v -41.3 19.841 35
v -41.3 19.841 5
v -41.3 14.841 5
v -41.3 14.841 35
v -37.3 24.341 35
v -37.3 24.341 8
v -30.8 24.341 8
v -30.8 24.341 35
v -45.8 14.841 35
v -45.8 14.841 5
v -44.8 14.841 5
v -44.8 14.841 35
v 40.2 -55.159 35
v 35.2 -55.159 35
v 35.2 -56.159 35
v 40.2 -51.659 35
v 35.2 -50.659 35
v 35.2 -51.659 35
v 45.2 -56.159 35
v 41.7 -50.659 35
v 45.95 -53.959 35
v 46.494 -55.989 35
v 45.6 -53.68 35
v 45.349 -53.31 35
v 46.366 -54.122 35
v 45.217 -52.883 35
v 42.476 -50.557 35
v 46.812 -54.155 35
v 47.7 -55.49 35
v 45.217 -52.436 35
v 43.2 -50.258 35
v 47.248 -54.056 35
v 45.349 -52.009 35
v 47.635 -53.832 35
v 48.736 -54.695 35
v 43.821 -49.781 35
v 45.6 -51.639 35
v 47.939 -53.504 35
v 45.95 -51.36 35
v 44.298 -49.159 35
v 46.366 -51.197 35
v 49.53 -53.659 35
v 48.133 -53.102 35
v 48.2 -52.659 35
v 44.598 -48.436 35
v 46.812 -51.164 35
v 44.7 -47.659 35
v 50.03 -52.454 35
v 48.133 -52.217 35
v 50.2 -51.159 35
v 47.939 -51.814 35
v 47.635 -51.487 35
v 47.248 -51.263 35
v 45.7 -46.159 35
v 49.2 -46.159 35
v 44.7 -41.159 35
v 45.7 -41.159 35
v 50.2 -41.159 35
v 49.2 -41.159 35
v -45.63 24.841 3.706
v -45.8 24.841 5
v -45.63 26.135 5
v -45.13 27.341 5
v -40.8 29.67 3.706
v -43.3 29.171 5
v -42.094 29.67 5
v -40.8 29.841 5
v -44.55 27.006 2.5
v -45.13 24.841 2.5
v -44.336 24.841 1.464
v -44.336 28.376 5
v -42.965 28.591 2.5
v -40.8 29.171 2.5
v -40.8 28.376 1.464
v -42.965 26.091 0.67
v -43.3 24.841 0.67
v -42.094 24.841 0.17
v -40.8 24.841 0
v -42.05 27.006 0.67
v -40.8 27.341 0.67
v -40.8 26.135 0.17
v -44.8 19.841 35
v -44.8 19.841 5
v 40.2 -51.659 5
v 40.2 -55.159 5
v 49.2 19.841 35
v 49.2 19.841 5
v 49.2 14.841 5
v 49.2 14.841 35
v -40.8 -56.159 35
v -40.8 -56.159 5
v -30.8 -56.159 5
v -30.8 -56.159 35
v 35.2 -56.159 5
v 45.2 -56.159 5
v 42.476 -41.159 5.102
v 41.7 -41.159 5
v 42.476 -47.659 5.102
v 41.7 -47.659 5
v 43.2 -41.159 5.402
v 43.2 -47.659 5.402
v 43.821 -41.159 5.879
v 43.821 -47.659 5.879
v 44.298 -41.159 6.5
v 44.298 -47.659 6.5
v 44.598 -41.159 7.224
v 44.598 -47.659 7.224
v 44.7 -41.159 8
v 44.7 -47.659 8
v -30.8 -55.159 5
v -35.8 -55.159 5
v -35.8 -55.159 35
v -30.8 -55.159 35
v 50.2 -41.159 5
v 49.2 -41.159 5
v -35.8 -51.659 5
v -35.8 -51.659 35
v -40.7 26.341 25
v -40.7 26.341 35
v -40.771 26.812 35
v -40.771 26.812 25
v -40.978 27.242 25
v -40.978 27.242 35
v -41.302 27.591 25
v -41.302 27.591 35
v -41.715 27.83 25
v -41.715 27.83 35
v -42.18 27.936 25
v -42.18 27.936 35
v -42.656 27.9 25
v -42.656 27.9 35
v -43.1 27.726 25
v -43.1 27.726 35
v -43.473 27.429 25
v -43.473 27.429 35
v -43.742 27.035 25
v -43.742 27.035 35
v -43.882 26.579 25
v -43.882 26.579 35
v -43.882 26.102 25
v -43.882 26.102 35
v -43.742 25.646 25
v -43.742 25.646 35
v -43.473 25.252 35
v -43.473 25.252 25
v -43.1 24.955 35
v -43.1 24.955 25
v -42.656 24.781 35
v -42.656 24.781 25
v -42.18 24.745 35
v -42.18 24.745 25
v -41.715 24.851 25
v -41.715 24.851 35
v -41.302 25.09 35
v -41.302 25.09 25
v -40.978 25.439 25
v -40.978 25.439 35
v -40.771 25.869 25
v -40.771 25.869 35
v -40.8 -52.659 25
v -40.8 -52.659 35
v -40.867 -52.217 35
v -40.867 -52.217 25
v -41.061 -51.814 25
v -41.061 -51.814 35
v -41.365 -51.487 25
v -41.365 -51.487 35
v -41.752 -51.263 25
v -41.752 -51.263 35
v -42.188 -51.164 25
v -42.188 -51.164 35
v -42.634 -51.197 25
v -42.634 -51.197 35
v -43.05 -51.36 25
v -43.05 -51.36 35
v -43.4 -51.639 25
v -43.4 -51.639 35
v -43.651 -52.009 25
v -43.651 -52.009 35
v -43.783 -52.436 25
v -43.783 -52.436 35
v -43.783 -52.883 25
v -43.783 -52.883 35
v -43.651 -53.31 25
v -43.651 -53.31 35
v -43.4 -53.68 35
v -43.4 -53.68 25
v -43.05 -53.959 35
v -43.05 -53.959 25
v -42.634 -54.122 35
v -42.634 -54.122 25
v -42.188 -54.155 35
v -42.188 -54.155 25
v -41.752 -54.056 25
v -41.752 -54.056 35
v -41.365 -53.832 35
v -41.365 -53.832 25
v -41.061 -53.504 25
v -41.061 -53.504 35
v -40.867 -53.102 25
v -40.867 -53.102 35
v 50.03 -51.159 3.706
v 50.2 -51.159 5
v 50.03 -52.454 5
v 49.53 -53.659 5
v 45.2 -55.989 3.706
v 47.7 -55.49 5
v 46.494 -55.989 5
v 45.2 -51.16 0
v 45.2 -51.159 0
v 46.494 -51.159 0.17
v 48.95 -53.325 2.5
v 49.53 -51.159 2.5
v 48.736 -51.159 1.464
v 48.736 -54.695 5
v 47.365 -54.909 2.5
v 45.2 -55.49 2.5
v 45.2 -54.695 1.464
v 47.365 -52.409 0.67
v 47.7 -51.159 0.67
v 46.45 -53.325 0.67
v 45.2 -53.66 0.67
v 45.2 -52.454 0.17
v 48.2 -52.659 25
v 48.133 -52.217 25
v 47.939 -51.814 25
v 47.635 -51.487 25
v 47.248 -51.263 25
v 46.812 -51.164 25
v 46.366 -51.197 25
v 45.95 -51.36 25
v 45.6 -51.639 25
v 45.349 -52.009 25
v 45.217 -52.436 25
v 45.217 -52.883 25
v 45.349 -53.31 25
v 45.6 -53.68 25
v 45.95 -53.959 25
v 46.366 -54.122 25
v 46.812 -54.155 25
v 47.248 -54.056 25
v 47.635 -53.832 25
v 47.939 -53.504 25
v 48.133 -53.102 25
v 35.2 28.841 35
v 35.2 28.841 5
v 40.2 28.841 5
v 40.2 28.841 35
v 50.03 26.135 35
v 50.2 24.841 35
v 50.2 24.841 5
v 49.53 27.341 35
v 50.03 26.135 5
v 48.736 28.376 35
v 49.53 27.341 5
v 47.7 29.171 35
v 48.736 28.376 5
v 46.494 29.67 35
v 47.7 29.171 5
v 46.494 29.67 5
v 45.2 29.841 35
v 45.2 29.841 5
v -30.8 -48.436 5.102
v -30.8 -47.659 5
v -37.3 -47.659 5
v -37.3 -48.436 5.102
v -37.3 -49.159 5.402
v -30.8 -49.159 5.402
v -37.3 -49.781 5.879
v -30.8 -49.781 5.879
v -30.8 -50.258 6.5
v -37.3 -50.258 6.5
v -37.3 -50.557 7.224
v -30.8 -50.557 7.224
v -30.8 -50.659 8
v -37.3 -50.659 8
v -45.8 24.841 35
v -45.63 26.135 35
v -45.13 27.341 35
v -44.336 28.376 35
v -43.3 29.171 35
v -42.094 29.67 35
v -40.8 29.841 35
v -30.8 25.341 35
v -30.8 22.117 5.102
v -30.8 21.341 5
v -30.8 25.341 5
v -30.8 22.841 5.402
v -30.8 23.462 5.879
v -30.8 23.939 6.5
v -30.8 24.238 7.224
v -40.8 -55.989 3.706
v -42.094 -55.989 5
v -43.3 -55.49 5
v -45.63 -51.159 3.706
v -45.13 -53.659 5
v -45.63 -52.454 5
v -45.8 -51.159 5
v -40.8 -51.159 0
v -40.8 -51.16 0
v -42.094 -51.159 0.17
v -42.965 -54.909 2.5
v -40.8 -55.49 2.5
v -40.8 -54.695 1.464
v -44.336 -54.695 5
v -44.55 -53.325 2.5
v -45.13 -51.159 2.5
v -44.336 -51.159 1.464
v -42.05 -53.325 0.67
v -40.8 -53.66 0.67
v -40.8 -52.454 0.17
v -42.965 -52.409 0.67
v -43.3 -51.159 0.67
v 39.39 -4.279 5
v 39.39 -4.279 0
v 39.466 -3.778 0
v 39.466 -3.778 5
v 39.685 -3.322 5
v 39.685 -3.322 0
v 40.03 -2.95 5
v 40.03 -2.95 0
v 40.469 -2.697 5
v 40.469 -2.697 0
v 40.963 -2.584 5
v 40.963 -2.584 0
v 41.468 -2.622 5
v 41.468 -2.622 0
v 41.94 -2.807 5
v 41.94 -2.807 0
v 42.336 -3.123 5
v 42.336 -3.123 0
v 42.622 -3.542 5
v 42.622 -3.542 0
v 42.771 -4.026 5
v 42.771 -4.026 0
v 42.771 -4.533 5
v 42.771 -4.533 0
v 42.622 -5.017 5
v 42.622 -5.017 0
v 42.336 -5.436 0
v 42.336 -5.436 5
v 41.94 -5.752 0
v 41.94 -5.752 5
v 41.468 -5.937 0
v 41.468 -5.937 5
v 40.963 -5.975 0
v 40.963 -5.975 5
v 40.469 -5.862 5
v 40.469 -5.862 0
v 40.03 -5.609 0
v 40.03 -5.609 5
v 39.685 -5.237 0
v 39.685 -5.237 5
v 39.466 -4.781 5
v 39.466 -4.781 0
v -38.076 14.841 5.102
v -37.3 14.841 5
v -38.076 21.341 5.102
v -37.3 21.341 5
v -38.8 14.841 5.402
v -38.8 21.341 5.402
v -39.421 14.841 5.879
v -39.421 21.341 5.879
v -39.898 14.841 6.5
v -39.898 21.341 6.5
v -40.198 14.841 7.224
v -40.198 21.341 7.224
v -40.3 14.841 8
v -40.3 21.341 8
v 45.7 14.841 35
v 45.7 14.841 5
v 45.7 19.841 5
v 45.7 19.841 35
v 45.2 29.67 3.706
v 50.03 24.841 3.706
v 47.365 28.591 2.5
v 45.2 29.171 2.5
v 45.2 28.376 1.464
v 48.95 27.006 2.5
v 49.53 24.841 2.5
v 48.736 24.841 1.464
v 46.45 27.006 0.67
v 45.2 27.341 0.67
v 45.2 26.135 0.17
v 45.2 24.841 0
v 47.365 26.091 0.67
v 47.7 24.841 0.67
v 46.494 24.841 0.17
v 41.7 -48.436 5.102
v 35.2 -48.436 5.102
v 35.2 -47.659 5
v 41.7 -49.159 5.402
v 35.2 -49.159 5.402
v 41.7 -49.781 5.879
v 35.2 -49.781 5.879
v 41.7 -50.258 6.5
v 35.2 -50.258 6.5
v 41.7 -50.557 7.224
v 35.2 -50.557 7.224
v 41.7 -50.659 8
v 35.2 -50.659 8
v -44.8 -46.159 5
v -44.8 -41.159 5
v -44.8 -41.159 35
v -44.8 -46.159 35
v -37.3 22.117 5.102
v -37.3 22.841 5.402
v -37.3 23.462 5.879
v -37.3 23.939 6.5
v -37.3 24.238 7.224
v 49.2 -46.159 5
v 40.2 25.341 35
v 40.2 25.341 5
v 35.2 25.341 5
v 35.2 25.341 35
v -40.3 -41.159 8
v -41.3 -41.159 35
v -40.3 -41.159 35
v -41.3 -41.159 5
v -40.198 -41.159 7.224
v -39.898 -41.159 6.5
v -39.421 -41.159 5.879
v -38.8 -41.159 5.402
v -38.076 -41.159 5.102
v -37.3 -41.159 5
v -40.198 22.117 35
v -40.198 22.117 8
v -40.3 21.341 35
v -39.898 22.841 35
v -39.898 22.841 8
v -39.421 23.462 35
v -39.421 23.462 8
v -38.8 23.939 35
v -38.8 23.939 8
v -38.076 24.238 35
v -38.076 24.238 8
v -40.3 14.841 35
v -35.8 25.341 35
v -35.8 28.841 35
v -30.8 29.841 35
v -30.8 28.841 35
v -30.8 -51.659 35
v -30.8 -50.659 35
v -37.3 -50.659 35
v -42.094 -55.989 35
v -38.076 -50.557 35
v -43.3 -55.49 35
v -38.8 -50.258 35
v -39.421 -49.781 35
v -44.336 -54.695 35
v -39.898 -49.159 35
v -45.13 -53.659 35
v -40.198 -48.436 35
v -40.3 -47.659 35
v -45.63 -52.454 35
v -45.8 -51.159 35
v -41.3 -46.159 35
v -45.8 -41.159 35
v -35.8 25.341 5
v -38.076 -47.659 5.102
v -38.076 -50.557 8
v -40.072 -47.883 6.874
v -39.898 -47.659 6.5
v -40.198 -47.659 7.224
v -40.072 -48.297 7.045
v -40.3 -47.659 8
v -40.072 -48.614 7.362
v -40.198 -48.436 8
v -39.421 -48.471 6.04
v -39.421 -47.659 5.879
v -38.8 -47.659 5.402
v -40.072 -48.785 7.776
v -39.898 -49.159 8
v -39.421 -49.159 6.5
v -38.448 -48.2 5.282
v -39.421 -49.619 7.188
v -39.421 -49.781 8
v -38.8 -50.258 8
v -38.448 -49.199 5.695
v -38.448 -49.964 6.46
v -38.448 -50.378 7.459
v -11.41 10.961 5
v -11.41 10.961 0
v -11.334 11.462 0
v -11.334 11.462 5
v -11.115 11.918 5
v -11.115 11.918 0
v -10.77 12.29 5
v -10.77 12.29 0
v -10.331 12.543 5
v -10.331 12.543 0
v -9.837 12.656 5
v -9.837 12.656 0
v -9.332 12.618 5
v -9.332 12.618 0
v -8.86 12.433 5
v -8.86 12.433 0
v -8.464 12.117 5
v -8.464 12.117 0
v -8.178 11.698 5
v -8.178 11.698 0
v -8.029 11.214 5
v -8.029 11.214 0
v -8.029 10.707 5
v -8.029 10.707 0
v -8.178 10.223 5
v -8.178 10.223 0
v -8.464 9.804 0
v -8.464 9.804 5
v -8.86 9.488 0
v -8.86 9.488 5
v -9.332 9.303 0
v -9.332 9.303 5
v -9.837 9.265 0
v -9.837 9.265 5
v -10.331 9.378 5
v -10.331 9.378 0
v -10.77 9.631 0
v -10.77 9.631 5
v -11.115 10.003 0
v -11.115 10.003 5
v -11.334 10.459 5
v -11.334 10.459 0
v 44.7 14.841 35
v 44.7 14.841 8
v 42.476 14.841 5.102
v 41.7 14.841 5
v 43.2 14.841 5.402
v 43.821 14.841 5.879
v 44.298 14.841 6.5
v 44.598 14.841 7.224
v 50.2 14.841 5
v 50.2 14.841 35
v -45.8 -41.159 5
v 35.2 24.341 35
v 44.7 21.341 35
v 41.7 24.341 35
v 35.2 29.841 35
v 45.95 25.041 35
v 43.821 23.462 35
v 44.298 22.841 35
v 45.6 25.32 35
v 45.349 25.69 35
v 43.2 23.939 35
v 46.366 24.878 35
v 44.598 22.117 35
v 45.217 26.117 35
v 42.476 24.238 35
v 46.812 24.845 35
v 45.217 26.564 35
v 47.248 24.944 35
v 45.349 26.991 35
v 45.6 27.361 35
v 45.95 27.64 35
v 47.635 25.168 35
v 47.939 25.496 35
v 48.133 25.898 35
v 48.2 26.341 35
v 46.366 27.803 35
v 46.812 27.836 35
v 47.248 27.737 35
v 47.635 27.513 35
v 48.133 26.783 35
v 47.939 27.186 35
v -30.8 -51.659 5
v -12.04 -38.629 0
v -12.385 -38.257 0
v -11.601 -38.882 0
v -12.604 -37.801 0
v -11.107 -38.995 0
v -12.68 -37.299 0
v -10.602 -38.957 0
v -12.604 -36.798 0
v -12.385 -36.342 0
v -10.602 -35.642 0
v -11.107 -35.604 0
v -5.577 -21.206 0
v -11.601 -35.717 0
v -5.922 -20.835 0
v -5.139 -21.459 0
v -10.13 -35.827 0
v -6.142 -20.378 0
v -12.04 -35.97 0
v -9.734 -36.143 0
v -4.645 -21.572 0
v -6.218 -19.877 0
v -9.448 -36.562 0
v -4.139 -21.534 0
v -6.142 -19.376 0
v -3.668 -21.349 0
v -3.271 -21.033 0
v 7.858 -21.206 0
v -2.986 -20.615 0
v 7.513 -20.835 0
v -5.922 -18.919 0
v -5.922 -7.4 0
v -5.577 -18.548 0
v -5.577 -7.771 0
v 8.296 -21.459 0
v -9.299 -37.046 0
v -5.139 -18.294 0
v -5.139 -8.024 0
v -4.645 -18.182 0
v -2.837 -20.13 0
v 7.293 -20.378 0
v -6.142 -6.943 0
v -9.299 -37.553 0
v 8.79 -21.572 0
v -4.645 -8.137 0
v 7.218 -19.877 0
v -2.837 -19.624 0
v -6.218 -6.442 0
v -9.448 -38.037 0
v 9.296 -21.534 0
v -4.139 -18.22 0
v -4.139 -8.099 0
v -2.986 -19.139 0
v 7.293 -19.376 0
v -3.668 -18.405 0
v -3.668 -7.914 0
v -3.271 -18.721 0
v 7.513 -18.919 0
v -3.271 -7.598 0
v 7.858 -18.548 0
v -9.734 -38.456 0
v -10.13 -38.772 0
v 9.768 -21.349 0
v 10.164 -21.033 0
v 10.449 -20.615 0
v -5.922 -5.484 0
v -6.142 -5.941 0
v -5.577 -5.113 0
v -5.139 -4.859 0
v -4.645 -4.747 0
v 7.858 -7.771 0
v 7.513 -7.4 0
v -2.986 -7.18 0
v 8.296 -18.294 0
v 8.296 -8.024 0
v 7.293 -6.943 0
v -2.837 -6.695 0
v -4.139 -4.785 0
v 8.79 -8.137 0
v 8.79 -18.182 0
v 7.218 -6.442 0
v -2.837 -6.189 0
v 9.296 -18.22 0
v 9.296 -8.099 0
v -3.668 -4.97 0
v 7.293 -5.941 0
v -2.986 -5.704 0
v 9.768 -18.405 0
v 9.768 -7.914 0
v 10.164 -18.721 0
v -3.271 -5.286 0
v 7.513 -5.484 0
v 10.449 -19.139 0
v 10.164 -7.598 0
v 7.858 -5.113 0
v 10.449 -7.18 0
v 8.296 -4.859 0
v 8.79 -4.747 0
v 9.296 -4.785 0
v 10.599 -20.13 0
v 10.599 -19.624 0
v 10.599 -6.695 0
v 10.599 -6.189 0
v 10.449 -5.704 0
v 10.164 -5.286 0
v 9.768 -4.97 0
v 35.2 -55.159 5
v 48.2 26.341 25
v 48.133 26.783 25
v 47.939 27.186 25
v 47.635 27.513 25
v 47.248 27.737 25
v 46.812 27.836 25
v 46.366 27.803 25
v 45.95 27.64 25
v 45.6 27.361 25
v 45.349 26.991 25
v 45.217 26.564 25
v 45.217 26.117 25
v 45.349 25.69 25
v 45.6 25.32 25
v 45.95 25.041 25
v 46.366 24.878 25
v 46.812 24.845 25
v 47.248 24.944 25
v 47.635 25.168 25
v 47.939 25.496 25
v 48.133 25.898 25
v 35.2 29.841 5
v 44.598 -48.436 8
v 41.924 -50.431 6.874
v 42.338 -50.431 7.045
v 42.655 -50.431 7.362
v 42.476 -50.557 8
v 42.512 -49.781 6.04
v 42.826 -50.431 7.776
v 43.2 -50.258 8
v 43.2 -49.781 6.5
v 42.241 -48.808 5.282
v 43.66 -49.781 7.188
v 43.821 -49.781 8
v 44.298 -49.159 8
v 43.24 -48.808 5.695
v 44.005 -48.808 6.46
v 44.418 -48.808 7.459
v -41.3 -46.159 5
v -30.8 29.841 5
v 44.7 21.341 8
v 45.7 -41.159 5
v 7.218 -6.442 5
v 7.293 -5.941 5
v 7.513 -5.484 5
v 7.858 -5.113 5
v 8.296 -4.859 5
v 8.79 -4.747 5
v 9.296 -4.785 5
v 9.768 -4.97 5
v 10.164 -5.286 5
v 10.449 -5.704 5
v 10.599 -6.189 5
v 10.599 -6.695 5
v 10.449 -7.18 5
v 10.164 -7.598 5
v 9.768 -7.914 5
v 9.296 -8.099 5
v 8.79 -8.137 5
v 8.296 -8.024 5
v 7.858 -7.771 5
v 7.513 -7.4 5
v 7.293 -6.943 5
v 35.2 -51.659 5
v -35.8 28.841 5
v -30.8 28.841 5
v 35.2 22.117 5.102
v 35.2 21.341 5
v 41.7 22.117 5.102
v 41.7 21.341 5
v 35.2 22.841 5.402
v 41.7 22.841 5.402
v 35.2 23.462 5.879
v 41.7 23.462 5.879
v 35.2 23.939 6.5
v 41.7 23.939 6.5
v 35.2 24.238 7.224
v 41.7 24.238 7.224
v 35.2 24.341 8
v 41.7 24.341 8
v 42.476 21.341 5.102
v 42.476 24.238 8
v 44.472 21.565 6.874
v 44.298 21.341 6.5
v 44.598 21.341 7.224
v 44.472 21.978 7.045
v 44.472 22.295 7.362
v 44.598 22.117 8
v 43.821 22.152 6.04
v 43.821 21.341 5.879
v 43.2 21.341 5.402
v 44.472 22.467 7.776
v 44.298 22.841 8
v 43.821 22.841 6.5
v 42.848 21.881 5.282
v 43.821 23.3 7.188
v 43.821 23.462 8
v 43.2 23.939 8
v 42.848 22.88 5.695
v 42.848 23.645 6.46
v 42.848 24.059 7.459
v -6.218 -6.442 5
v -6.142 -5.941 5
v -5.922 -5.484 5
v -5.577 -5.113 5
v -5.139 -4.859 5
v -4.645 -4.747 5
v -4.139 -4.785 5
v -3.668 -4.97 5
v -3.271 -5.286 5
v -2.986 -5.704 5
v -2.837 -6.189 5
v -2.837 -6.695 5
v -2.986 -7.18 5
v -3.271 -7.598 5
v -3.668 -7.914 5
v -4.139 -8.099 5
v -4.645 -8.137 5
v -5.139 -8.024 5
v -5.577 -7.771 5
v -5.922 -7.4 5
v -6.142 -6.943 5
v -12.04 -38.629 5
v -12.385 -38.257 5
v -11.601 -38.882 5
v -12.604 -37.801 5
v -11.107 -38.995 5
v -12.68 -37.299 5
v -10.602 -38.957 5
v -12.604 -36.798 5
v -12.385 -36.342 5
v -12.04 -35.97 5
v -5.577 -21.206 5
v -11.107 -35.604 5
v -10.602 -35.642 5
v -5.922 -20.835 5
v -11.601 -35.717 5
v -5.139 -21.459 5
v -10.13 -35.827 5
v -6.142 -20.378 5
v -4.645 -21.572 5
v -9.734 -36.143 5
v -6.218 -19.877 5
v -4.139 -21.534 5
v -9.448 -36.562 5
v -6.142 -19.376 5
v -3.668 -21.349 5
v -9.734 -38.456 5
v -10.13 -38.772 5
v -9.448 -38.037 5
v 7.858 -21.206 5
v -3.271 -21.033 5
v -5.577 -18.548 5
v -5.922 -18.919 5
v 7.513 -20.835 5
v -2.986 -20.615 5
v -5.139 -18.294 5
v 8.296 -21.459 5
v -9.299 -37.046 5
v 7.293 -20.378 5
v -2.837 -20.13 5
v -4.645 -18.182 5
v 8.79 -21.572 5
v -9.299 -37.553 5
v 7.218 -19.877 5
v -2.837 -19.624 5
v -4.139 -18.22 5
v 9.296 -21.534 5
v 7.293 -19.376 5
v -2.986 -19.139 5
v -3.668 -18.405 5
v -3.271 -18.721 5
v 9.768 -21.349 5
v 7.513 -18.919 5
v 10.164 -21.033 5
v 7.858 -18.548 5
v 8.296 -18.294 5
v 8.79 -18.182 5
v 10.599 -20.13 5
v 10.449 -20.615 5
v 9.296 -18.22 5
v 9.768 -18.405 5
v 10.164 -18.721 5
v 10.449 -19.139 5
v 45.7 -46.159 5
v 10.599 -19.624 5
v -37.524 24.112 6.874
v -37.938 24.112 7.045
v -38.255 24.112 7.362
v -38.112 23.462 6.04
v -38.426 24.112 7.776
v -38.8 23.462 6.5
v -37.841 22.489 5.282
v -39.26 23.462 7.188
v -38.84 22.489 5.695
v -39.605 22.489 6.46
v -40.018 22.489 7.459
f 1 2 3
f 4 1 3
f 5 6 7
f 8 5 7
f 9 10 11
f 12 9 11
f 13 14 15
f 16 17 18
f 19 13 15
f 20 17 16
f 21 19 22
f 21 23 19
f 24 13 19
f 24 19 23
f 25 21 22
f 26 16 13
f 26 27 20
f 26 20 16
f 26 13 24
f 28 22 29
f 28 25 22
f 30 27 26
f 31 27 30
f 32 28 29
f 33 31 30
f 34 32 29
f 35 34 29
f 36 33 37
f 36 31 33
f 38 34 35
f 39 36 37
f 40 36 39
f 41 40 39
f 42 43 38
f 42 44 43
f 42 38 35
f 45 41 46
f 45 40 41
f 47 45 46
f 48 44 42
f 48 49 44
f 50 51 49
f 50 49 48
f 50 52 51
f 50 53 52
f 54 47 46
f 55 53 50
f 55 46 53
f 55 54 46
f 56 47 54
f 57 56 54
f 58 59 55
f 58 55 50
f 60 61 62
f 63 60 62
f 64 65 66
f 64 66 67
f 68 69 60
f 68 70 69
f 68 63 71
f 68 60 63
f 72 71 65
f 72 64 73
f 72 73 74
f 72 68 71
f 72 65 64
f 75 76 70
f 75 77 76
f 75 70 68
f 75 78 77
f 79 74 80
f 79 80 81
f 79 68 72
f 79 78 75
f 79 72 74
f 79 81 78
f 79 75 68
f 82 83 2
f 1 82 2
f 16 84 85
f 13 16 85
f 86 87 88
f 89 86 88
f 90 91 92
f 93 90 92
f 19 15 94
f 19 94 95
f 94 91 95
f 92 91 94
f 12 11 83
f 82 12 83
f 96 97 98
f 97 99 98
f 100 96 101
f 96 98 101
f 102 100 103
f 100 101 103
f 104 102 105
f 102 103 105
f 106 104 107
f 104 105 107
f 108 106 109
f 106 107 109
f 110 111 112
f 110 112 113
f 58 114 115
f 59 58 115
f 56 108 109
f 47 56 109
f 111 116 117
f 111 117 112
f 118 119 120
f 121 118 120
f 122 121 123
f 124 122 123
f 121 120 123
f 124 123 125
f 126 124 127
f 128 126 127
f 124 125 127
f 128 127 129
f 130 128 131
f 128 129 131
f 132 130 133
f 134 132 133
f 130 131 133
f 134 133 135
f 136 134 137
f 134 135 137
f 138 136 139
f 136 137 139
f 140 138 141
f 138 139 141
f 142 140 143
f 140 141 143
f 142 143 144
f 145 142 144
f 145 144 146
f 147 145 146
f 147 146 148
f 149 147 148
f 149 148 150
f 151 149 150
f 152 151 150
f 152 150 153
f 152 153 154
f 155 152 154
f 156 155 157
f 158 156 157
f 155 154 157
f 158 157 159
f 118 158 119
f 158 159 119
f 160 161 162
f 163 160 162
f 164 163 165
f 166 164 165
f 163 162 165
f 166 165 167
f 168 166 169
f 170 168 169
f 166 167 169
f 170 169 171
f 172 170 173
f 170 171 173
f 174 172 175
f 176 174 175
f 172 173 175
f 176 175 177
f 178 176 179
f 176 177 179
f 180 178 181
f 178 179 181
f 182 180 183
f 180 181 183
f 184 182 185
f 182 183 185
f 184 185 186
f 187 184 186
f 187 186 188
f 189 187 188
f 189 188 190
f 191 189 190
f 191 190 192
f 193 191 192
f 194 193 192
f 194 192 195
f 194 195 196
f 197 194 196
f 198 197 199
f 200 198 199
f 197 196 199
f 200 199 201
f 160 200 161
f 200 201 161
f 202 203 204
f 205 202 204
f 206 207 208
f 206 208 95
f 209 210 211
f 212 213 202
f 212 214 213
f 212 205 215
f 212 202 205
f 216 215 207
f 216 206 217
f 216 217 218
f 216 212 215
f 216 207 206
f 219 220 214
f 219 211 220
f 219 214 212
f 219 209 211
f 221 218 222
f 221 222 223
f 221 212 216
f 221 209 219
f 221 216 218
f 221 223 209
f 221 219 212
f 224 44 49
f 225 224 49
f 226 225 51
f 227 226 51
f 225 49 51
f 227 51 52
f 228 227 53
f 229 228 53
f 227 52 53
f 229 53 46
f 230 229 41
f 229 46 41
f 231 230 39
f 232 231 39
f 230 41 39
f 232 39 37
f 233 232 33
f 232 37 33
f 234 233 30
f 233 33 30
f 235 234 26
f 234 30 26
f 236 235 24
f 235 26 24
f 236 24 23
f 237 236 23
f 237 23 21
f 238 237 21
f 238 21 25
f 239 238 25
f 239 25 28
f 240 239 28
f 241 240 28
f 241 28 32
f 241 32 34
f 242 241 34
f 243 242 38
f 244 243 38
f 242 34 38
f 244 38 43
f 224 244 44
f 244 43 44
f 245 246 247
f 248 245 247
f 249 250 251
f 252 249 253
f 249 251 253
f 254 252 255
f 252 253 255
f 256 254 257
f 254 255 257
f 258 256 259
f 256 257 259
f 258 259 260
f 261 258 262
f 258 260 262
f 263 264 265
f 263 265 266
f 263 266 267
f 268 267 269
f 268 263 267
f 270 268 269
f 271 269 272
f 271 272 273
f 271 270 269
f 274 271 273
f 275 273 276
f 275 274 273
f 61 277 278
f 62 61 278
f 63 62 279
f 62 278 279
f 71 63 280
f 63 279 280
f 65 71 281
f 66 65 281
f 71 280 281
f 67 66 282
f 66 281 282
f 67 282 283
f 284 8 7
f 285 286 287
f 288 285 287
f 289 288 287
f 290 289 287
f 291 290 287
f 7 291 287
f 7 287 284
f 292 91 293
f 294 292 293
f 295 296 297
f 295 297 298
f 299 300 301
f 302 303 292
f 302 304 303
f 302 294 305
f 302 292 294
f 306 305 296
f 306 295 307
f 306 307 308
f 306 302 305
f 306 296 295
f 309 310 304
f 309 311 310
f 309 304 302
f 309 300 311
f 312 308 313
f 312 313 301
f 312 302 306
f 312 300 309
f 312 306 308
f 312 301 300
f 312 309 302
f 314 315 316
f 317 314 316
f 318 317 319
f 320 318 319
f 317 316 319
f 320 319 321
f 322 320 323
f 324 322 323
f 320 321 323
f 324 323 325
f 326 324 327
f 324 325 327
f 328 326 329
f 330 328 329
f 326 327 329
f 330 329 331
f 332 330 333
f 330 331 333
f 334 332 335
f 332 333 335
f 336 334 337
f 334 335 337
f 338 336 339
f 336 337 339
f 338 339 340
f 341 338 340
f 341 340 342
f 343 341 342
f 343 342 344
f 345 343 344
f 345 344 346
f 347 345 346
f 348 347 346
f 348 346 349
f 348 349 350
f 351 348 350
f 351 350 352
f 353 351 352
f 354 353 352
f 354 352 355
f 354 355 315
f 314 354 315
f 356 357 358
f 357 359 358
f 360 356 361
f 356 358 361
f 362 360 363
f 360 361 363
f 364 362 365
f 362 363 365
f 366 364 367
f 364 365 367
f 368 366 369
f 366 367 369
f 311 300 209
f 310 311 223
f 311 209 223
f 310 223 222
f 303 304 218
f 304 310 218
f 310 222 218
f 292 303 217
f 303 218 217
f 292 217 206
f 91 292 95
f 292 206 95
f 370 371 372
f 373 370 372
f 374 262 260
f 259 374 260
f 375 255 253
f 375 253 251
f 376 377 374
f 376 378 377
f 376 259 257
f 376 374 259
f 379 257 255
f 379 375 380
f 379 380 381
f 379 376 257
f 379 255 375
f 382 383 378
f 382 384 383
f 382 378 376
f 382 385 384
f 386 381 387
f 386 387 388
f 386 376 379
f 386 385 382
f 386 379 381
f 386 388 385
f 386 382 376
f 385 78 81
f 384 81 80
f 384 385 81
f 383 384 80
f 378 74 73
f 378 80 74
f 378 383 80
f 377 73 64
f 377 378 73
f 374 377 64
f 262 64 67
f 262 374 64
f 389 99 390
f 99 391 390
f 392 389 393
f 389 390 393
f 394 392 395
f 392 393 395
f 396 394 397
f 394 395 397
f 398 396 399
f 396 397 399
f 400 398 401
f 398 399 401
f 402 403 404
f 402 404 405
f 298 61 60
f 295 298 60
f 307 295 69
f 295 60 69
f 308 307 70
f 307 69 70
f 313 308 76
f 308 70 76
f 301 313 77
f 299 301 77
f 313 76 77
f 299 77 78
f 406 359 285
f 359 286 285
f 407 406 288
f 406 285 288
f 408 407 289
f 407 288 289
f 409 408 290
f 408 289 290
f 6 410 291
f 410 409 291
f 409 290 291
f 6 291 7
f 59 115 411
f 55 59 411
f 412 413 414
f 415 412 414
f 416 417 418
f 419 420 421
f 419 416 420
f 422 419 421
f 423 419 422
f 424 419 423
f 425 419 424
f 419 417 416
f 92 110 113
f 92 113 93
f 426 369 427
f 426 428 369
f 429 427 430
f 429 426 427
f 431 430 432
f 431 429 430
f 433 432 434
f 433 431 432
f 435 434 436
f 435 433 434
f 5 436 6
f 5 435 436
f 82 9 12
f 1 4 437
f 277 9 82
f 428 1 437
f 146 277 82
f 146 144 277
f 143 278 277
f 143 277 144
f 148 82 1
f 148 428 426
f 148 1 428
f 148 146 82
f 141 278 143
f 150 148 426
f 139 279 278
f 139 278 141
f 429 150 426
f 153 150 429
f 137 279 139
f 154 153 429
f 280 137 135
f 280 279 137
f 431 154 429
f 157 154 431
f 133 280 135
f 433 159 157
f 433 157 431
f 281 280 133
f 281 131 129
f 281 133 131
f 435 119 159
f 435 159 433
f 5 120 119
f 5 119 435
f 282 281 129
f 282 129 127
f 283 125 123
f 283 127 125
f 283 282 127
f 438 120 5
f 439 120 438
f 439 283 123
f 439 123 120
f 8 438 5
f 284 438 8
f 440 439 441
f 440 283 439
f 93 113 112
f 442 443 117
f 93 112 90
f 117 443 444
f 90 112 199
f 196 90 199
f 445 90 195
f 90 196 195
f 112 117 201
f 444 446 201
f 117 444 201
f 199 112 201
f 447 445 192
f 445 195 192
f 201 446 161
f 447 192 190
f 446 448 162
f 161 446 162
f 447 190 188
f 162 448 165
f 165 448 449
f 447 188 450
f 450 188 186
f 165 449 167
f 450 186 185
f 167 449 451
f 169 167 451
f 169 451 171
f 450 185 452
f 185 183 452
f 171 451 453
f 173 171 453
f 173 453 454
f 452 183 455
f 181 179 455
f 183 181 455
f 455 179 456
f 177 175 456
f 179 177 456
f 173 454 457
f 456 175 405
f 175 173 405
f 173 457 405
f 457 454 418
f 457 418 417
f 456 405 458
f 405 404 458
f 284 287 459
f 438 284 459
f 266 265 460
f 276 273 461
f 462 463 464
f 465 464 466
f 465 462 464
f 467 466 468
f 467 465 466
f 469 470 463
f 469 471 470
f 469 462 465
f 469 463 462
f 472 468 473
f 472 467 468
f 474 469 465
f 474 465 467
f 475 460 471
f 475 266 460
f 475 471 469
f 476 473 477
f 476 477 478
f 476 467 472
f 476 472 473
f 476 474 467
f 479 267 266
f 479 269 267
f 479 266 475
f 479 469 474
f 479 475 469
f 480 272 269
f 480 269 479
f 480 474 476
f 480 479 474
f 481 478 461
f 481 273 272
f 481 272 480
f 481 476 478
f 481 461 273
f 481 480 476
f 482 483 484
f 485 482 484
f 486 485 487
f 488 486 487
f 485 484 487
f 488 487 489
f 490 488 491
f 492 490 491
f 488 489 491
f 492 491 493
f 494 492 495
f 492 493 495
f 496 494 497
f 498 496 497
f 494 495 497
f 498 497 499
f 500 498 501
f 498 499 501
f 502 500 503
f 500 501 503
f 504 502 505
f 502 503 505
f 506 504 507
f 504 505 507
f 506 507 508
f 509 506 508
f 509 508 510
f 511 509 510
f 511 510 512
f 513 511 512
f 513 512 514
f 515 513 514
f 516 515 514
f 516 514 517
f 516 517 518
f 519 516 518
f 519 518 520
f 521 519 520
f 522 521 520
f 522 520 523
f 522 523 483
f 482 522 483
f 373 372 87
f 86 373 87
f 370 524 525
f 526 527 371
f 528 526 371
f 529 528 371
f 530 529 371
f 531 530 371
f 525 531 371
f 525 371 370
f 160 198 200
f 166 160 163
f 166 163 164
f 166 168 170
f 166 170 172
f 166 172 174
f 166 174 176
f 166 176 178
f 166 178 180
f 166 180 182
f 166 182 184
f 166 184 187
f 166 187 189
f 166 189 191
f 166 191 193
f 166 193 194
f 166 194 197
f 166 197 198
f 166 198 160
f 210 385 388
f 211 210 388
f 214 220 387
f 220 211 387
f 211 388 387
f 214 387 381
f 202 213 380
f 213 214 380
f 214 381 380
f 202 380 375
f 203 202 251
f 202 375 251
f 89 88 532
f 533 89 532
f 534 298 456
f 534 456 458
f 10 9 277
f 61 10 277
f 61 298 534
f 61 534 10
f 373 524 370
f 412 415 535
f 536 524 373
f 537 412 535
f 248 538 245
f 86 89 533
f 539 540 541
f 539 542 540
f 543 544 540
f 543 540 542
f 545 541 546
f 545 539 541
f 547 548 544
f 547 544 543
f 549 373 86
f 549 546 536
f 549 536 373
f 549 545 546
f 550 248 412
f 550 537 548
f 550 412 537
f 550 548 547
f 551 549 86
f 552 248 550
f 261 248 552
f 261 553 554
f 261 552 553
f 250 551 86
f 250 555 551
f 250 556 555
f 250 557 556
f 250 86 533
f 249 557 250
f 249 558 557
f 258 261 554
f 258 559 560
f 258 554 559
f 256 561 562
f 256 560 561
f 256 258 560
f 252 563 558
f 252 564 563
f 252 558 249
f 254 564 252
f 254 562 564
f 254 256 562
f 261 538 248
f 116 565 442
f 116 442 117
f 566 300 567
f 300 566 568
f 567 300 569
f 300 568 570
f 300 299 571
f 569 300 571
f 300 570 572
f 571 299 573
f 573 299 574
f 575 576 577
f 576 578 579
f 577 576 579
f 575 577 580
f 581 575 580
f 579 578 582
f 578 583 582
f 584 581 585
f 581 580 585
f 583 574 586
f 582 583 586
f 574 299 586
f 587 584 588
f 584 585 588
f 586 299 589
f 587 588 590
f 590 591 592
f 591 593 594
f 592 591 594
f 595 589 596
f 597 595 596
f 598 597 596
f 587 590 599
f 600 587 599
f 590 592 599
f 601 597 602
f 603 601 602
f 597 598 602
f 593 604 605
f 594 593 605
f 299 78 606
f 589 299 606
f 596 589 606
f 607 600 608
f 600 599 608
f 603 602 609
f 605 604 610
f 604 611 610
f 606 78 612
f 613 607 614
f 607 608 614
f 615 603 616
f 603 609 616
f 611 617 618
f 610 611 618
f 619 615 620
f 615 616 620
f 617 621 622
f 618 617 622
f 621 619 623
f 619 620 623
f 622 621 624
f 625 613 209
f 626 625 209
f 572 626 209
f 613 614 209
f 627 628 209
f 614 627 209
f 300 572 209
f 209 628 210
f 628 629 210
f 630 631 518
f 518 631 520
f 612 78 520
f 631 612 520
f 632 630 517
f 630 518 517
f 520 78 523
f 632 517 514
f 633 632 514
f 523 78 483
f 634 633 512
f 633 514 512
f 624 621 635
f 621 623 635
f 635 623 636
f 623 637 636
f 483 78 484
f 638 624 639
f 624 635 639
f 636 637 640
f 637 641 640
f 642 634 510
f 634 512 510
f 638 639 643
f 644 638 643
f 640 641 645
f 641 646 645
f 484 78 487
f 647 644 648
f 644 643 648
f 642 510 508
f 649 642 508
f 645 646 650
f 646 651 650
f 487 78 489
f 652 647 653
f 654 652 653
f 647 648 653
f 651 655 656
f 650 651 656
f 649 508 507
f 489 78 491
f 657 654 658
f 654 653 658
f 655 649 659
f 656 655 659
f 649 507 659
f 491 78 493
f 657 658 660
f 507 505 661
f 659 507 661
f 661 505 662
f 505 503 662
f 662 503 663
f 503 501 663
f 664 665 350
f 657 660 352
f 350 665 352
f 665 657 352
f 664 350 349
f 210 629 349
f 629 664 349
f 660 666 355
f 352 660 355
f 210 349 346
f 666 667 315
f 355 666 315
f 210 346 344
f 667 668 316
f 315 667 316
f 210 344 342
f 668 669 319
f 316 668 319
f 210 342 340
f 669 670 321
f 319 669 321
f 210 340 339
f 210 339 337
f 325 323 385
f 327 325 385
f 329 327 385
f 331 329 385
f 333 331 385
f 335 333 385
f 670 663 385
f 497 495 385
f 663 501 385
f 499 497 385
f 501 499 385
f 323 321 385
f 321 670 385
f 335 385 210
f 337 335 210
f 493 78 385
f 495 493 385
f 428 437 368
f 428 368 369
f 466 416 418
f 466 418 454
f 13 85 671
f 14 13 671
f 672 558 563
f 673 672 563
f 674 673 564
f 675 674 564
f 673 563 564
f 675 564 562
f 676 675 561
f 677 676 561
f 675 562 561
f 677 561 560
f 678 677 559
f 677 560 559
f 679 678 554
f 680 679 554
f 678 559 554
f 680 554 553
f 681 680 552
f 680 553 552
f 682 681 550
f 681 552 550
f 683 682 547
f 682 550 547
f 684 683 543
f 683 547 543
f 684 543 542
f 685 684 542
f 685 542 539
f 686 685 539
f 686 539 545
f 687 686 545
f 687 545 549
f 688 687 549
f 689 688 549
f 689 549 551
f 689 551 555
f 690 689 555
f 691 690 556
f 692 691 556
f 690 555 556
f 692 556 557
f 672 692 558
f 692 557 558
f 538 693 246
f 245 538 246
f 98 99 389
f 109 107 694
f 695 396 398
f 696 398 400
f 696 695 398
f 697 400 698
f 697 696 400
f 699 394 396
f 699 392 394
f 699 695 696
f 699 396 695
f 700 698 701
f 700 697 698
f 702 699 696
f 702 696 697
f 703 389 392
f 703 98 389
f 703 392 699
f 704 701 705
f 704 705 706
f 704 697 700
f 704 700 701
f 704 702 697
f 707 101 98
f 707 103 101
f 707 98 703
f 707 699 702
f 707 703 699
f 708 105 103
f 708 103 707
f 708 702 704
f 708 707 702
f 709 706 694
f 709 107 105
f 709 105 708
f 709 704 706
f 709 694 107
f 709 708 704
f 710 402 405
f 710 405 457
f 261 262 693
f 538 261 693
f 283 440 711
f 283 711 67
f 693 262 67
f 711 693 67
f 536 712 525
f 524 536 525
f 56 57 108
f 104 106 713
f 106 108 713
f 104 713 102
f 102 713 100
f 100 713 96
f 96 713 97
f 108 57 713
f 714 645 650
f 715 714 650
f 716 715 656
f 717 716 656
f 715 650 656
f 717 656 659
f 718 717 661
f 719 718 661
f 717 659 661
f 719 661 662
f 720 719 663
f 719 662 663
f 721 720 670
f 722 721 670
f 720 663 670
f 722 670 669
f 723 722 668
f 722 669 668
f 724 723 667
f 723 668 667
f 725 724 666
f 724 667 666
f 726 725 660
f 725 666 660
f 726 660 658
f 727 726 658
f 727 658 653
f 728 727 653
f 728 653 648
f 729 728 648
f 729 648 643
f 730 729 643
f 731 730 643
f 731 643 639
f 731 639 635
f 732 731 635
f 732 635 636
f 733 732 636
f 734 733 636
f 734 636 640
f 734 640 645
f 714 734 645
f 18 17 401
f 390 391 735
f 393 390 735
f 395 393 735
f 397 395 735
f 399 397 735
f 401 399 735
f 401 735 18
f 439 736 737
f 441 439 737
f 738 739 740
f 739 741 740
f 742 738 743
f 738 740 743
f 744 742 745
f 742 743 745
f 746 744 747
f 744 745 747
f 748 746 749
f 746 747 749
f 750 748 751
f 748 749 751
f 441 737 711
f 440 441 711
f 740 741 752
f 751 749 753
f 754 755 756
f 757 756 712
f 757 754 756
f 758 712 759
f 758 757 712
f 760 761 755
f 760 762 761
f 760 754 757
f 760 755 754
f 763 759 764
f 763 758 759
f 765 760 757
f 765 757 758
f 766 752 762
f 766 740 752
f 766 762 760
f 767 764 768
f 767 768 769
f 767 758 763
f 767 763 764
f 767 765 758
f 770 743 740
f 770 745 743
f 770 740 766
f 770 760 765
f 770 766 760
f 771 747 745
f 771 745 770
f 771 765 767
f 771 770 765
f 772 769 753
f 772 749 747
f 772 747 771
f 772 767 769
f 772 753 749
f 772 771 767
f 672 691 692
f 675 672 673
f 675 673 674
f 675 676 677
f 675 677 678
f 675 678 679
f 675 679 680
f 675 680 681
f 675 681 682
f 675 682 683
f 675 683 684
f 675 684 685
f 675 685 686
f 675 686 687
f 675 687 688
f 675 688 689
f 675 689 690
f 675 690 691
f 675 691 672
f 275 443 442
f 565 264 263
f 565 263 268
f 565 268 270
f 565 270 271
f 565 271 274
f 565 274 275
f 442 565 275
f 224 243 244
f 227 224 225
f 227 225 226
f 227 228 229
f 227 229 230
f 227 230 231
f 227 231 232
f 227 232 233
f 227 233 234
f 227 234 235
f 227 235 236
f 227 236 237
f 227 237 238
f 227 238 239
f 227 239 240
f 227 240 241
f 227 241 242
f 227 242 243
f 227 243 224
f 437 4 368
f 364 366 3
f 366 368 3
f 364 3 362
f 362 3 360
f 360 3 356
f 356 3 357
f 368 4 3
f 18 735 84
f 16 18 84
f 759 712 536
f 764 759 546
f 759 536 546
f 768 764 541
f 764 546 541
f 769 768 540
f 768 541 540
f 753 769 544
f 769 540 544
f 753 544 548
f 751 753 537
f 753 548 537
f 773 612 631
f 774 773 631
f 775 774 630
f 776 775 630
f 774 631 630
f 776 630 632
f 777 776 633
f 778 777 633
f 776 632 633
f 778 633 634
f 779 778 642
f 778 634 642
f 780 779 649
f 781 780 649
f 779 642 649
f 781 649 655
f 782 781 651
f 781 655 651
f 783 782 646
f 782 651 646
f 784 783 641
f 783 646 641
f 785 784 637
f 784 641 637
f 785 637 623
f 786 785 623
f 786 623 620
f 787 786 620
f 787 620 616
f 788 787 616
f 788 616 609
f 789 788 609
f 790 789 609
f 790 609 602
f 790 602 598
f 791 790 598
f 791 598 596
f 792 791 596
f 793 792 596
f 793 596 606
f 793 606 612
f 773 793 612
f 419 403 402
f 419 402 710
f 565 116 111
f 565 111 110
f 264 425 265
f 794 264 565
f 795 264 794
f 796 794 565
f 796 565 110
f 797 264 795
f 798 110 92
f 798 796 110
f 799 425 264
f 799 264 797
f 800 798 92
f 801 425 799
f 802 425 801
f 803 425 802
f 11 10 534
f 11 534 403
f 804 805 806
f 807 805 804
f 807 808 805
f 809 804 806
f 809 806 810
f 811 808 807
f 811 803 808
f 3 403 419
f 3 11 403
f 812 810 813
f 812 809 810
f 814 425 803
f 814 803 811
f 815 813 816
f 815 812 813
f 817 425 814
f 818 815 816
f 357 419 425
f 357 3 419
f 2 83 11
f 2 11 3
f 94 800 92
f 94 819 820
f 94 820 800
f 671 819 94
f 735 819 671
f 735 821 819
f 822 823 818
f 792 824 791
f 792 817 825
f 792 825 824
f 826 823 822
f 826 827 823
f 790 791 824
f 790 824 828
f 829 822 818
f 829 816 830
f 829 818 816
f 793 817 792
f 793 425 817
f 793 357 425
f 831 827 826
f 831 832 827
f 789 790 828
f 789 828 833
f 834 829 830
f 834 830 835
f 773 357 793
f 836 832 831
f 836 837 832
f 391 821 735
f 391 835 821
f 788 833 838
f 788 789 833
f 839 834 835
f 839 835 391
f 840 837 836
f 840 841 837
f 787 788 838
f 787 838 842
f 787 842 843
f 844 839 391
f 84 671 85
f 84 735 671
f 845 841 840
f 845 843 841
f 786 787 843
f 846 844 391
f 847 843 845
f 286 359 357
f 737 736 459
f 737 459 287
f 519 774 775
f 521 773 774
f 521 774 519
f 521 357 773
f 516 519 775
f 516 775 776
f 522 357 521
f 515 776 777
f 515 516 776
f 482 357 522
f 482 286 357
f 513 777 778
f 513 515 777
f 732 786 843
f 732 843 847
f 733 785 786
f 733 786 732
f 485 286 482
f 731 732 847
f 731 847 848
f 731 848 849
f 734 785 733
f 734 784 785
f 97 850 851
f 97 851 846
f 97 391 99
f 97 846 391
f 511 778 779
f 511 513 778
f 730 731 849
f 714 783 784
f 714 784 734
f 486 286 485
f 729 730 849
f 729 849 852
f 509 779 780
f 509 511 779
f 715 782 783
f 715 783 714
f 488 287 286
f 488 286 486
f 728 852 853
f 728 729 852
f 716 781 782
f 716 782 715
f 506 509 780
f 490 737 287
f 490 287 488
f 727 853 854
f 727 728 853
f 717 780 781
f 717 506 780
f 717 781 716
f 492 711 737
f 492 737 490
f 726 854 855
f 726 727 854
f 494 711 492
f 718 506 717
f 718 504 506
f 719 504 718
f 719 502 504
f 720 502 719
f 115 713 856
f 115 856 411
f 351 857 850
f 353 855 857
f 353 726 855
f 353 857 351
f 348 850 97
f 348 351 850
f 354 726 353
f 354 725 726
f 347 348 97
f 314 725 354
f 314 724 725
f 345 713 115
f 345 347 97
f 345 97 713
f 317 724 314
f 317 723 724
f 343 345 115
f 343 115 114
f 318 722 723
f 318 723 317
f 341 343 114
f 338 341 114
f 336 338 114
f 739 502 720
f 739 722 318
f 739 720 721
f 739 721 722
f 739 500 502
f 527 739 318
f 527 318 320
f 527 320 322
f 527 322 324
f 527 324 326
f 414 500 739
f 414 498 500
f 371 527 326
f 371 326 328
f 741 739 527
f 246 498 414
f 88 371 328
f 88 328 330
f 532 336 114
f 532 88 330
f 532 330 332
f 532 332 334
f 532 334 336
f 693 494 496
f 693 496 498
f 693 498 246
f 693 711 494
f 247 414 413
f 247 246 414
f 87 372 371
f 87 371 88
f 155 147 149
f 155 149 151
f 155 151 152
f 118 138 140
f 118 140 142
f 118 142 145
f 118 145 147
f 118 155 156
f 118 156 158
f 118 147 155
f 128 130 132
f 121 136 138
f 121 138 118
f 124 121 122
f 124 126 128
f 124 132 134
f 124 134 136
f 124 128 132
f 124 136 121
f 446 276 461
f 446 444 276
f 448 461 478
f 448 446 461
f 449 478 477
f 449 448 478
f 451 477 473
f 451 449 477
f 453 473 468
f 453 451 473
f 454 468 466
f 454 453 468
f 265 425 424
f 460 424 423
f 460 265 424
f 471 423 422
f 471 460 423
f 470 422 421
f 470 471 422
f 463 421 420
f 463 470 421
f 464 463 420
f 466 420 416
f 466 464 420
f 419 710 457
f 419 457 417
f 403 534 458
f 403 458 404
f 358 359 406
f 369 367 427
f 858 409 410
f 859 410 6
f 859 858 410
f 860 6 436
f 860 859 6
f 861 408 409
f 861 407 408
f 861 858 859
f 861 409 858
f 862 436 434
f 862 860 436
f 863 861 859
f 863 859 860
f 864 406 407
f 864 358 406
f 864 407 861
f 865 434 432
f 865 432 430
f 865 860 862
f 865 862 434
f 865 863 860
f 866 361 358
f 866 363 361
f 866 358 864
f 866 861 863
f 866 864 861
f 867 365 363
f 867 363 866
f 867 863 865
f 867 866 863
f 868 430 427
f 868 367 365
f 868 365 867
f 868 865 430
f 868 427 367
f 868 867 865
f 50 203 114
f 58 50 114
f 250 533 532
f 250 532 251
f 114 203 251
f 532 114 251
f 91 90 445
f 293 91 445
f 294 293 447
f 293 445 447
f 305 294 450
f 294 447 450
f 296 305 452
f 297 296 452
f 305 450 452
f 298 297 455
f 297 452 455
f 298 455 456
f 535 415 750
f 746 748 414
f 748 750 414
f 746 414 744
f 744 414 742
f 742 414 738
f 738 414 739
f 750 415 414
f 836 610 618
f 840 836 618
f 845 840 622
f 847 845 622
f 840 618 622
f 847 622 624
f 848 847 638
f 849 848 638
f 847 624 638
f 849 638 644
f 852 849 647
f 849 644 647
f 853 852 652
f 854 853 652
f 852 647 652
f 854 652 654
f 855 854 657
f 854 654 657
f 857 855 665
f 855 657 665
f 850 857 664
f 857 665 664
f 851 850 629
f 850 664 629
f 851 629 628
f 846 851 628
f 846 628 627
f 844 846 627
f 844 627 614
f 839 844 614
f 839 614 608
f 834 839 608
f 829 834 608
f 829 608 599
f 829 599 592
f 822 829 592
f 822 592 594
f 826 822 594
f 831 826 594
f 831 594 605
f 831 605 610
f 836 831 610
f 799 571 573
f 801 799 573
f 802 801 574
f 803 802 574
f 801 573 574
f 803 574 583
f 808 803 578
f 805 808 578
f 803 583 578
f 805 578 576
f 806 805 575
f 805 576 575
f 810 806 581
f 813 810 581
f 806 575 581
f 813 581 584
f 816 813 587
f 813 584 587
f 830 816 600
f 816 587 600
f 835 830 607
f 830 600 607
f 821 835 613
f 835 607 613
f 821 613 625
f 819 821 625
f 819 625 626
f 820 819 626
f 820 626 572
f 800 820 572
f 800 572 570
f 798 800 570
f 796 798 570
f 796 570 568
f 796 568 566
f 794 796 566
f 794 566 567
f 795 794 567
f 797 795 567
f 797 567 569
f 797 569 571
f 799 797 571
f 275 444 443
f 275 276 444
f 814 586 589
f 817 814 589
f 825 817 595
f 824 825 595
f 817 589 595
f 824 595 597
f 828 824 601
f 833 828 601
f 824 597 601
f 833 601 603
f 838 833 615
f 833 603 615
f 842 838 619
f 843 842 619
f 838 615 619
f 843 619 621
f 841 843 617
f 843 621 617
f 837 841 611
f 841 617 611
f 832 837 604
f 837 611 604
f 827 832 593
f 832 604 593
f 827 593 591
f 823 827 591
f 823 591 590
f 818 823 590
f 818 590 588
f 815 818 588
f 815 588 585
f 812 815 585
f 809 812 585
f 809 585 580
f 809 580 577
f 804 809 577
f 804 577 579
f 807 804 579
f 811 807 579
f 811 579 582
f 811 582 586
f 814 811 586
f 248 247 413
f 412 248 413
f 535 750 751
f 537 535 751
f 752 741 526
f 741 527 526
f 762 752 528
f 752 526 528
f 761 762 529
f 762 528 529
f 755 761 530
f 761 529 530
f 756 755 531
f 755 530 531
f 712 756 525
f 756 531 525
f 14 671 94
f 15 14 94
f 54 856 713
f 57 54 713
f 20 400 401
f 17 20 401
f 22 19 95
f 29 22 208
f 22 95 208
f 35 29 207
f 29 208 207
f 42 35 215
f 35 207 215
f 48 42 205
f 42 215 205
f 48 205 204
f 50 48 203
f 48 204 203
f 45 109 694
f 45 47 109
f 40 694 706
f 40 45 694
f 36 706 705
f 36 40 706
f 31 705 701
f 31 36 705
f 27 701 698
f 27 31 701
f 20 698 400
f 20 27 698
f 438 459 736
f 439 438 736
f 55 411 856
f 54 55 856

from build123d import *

# Parameters (mm, degrees)
ESQUISSE1_W             = 96
ESQUISSE1_H             = 86
BOSS_EXTRU_1_DEPTH      = 5
BOSS_EXTRU_4_DEPTH      = 30
CONG_2_R                = 5
ESQUISSE4_R             = 1.6
ENL_V_MAT_EXTRU_1_DEPTH = 10
BOSS_EXTRU_17_DEPTH     = 30
ESQUISSE22_R            = 1.5
ENL_V_MAT_EXTRU_5_DEPTH = 10
BOSS_EXTRU_14_DEPTH     = 20
BOSS_EXTRU_15_DEPTH     = 30
ESQUISSE17_R            = 1.5
ENL_V_MAT_EXTRU_3_DEPTH = 10
BOSS_EXTRU_16_DEPTH     = 30
ESQUISSE19_R            = 1.5
ENL_V_MAT_EXTRU_4_DEPTH = 10
CONG_6_R                = 5
CONG_14_R               = 3
TROUM3_D                = 3.4


# Some blends are built 0.0001 mm under size
with BuildPart() as part:
    # Esquisse1 → Boss.-Extru.1 (new body)
    with BuildSketch(Plane.XY):
        with Locations((2.2, -13.159463773)):
            Rectangle(ESQUISSE1_W, ESQUISSE1_H)
    extrude(amount=BOSS_EXTRU_1_DEPTH)

    # Esquisse2 → Boss.-Extru.4 (add)
    with BuildSketch(Plane.XY.offset(5)):
        Polygon((-45.8, 29.840536227), (-45.8, 14.840536227), (-44.8, 14.840536227), (-44.8, 19.840536227), (-41.3, 19.840536227), (-41.3, 14.840536227), (-40.3, 14.840536227), (-40.3, 24.340536227), (-30.8, 24.340536227), (-30.8, 25.340536227), (-35.8, 25.340536227), (-35.8, 28.840536227), (-30.8, 28.840536227), (-30.8, 29.840536227), align=None)
    extrude(amount=BOSS_EXTRU_4_DEPTH)

    # Congé2
    cong_2_edges = [part.edges().sort_by_distance(p)[0] for p in [
        (-45.8, -13.159463773, 0),
        (2.2, -56.159463773, 0),
        (50.2, -13.159463773, 0),
        (2.2, 29.840536227, 0),
    ]]
    fillet(cong_2_edges, radius=CONG_2_R - 0.0001)  # a hair under: the kernel refuses the full size

    # Esquisse4 → Enlèv. mat.-Extru.1 (cut)
    with BuildSketch(Plane.XY.offset(35)):
        with Locations((-42.3, 26.340536227)):
            Circle(ESQUISSE4_R)
    extrude(amount=-ENL_V_MAT_EXTRU_1_DEPTH, mode=Mode.SUBTRACT)

    # Esquisse21 → Boss.-Extru.17 (add)
    with BuildSketch(Plane.XY.offset(5)):
        Polygon((-45.8, -56.159463773), (-45.8, -41.159463773), (-44.8, -41.159463773), (-44.8, -46.159463773), (-41.3, -46.159463773), (-41.3, -41.159463773), (-40.3, -41.159463773), (-40.3, -50.659463773), (-30.8, -50.659463773), (-30.8, -51.659463773), (-35.8, -51.659463773), (-35.8, -55.159463773), (-30.8, -55.159463773), (-30.8, -56.159463773), align=None)
    extrude(amount=BOSS_EXTRU_17_DEPTH)

    # Esquisse22 → Enlèv. mat.-Extru.5 (cut)
    with BuildSketch(Plane.XY.offset(35)):
        with Locations((-42.3, -52.659463773)):
            Circle(ESQUISSE22_R)
    extrude(amount=-ENL_V_MAT_EXTRU_5_DEPTH, mode=Mode.SUBTRACT)

    # Esquisse14 → Boss.-Extru.14 (add)
    with BuildSketch(Plane.XY.offset(5)):
        Polygon((-45.8, -56.159463773), (-45.8, -41.159463773), (-44.8, -41.159463773), (-44.8, -46.159463773), (-41.3, -46.159463773), (-41.3, -41.159463773), (-40.3, -41.159463773), (-40.3, -50.659463773), (-30.8, -50.659463773), (-30.8, -51.659463773), (-35.8, -51.659463773), (-35.8, -55.159463773), (-30.8, -55.159463773), (-30.8, -56.159463773), align=None)
    extrude(amount=BOSS_EXTRU_14_DEPTH)

    # Esquisse16 → Boss.-Extru.15 (add)
    with BuildSketch(Plane.XY.offset(5)):
        Polygon((50.2, 29.840536227), (35.2, 29.840536227), (35.2, 28.840536227), (40.2, 28.840536227), (40.2, 25.340536227), (35.2, 25.340536227), (35.2, 24.340536227), (44.7, 24.340536227), (44.7, 14.840536227), (45.7, 14.840536227), (45.7, 19.840536227), (49.2, 19.840536227), (49.2, 14.840536227), (50.2, 14.840536227), align=None)
    extrude(amount=BOSS_EXTRU_15_DEPTH)

    # Esquisse17 → Enlèv. mat.-Extru.3 (cut)
    with BuildSketch(Plane.XY.offset(35)):
        with Locations((46.7, 26.340536227)):
            Circle(ESQUISSE17_R)
    extrude(amount=-ENL_V_MAT_EXTRU_3_DEPTH, mode=Mode.SUBTRACT)

    # Esquisse18 → Boss.-Extru.16 (add)
    with BuildSketch(Plane.XY.offset(5)):
        Polygon((50.2, -56.159463773), (50.2, -41.159463773), (49.2, -41.159463773), (49.2, -46.159463773), (45.7, -46.159463773), (45.7, -41.159463773), (44.7, -41.159463773), (44.7, -50.659463773), (35.2, -50.659463773), (35.2, -51.659463773), (40.2, -51.659463773), (40.2, -55.159463773), (35.2, -55.159463773), (35.2, -56.159463773), align=None)
    extrude(amount=BOSS_EXTRU_16_DEPTH)

    # Esquisse19 → Enlèv. mat.-Extru.4 (cut)
    with BuildSketch(Plane.XY.offset(35)):
        with Locations((46.7, -52.659463773)):
            Circle(ESQUISSE19_R)
    extrude(amount=-ENL_V_MAT_EXTRU_4_DEPTH, mode=Mode.SUBTRACT)

    # Congé6
    # the kernel refuses this fillet: 5 mm, written as the material it takes off along each edge
    with BuildSketch(Plane(origin=(-40.8, 24.840536227, 0), x_dir=(-1, 0, 0), z_dir=(0, -1, 0))) as cong_6_piece_1:
        with BuildLine():
            CenterArc((0.0001, -4.9999), 4.9999, 0, 90)
            Line((5, -4.9999), (5, 0))
            Line((5, 0), (0.0001, 0))
        make_face()
    revolve(axis=Axis((-40.8, 24.840536227, 0), (0, 0, -1)), revolution_arc=90, mode=Mode.SUBTRACT)
    with BuildSketch(Plane(origin=(45.2, 24.840536227, 0), x_dir=(0, 1, 0), z_dir=(-1, 0, 0))) as cong_6_piece_2:
        with BuildLine():
            CenterArc((0.0001, -4.9999), 4.9999, 0, 90)
            Line((5, -4.9999), (5, 0))
            Line((5, 0), (0.0001, 0))
        make_face()
    revolve(axis=Axis((45.2, 24.840536227, 0), (0, 0, -1)), revolution_arc=90, mode=Mode.SUBTRACT)
    with BuildSketch(Plane(origin=(-40.8, -51.159463773, 0), x_dir=(0, -1, 0), z_dir=(1, 0, 0))) as cong_6_piece_3:
        with BuildLine():
            CenterArc((0.0001, -4.9999), 4.9999, 0, 90)
            Line((5, -4.9999), (5, 0))
            Line((5, 0), (0.0001, 0))
        make_face()
    revolve(axis=Axis((-40.8, -51.159463773, 0), (0, 0, -1)), revolution_arc=90, mode=Mode.SUBTRACT)
    with BuildSketch(Plane(origin=(45.2, -51.159463773, 0), x_dir=(1, 0, 0), z_dir=(0, 1, 0))) as cong_6_piece_4:
        with BuildLine():
            CenterArc((0.0001, -4.9999), 4.9999, 0, 90)
            Line((5, -4.9999), (5, 0))
            Line((5, 0), (0.0001, 0))
        make_face()
    revolve(axis=Axis((45.2, -51.159463773, 0), (0, 0, -1)), revolution_arc=90, mode=Mode.SUBTRACT)
    with BuildSketch(Plane(origin=(50.2, 29.840536227, 0), x_dir=(0, -1, 0), z_dir=(0, 0, 1)), Plane(origin=(50.2, -56.159463773, 0), x_dir=(-1, 0, 0), z_dir=(0, 0, 1)), Plane(origin=(-45.8, -56.159463773, 47.5), x_dir=(1, 0, 0), z_dir=(0, 0, -1)), Plane(origin=(-45.8, 29.840536227, 47.5), x_dir=(0, -1, 0), z_dir=(0, 0, -1))) as cong_6_piece_5:
        with BuildLine():
            CenterArc((CONG_6_R, -CONG_6_R), CONG_6_R, 90, 90)
            Line((0, -CONG_6_R), (0, 0))
            Line((0, 0), (CONG_6_R, 0))
        make_face()
    extrude(amount=47.5, mode=Mode.SUBTRACT)

    # Congé14
    cong_14_edges = [part.edges().sort_by_distance(p)[0] for p in [
        (39.95, 24.340536227, 5),
        (44.7, 19.590536227, 5),
        (44.7, 24.340536227, 20),
        (-40.3, 19.590536227, 5),
        (44.7, -45.909463773, 5),
        (-35.55, 24.340536227, 5),
        (39.95, -50.659463773, 5),
        (44.7, -50.659463773, 20),
        (-40.3, 24.340536227, 20),
        (-35.55, -50.659463773, 5),
        (-40.3, -45.909463773, 5),
        (-40.3, -50.659463773, 20),
    ]]
    fillet(cong_14_edges, radius=CONG_14_R)

    # TrouM3 (through all)
    with Locations(Plane.XY.offset(5)):
        with Locations((-9.71, 10.960536227), (41.09, -4.279463773), (-10.98, -37.299463773), (-4.517514421, -19.876978194), (-4.517514421, -6.441949352), (8.917514421, -6.441949352), (8.917514421, -19.876978194)):
            Hole(TROUM3_D / 2)


solid = part.part
